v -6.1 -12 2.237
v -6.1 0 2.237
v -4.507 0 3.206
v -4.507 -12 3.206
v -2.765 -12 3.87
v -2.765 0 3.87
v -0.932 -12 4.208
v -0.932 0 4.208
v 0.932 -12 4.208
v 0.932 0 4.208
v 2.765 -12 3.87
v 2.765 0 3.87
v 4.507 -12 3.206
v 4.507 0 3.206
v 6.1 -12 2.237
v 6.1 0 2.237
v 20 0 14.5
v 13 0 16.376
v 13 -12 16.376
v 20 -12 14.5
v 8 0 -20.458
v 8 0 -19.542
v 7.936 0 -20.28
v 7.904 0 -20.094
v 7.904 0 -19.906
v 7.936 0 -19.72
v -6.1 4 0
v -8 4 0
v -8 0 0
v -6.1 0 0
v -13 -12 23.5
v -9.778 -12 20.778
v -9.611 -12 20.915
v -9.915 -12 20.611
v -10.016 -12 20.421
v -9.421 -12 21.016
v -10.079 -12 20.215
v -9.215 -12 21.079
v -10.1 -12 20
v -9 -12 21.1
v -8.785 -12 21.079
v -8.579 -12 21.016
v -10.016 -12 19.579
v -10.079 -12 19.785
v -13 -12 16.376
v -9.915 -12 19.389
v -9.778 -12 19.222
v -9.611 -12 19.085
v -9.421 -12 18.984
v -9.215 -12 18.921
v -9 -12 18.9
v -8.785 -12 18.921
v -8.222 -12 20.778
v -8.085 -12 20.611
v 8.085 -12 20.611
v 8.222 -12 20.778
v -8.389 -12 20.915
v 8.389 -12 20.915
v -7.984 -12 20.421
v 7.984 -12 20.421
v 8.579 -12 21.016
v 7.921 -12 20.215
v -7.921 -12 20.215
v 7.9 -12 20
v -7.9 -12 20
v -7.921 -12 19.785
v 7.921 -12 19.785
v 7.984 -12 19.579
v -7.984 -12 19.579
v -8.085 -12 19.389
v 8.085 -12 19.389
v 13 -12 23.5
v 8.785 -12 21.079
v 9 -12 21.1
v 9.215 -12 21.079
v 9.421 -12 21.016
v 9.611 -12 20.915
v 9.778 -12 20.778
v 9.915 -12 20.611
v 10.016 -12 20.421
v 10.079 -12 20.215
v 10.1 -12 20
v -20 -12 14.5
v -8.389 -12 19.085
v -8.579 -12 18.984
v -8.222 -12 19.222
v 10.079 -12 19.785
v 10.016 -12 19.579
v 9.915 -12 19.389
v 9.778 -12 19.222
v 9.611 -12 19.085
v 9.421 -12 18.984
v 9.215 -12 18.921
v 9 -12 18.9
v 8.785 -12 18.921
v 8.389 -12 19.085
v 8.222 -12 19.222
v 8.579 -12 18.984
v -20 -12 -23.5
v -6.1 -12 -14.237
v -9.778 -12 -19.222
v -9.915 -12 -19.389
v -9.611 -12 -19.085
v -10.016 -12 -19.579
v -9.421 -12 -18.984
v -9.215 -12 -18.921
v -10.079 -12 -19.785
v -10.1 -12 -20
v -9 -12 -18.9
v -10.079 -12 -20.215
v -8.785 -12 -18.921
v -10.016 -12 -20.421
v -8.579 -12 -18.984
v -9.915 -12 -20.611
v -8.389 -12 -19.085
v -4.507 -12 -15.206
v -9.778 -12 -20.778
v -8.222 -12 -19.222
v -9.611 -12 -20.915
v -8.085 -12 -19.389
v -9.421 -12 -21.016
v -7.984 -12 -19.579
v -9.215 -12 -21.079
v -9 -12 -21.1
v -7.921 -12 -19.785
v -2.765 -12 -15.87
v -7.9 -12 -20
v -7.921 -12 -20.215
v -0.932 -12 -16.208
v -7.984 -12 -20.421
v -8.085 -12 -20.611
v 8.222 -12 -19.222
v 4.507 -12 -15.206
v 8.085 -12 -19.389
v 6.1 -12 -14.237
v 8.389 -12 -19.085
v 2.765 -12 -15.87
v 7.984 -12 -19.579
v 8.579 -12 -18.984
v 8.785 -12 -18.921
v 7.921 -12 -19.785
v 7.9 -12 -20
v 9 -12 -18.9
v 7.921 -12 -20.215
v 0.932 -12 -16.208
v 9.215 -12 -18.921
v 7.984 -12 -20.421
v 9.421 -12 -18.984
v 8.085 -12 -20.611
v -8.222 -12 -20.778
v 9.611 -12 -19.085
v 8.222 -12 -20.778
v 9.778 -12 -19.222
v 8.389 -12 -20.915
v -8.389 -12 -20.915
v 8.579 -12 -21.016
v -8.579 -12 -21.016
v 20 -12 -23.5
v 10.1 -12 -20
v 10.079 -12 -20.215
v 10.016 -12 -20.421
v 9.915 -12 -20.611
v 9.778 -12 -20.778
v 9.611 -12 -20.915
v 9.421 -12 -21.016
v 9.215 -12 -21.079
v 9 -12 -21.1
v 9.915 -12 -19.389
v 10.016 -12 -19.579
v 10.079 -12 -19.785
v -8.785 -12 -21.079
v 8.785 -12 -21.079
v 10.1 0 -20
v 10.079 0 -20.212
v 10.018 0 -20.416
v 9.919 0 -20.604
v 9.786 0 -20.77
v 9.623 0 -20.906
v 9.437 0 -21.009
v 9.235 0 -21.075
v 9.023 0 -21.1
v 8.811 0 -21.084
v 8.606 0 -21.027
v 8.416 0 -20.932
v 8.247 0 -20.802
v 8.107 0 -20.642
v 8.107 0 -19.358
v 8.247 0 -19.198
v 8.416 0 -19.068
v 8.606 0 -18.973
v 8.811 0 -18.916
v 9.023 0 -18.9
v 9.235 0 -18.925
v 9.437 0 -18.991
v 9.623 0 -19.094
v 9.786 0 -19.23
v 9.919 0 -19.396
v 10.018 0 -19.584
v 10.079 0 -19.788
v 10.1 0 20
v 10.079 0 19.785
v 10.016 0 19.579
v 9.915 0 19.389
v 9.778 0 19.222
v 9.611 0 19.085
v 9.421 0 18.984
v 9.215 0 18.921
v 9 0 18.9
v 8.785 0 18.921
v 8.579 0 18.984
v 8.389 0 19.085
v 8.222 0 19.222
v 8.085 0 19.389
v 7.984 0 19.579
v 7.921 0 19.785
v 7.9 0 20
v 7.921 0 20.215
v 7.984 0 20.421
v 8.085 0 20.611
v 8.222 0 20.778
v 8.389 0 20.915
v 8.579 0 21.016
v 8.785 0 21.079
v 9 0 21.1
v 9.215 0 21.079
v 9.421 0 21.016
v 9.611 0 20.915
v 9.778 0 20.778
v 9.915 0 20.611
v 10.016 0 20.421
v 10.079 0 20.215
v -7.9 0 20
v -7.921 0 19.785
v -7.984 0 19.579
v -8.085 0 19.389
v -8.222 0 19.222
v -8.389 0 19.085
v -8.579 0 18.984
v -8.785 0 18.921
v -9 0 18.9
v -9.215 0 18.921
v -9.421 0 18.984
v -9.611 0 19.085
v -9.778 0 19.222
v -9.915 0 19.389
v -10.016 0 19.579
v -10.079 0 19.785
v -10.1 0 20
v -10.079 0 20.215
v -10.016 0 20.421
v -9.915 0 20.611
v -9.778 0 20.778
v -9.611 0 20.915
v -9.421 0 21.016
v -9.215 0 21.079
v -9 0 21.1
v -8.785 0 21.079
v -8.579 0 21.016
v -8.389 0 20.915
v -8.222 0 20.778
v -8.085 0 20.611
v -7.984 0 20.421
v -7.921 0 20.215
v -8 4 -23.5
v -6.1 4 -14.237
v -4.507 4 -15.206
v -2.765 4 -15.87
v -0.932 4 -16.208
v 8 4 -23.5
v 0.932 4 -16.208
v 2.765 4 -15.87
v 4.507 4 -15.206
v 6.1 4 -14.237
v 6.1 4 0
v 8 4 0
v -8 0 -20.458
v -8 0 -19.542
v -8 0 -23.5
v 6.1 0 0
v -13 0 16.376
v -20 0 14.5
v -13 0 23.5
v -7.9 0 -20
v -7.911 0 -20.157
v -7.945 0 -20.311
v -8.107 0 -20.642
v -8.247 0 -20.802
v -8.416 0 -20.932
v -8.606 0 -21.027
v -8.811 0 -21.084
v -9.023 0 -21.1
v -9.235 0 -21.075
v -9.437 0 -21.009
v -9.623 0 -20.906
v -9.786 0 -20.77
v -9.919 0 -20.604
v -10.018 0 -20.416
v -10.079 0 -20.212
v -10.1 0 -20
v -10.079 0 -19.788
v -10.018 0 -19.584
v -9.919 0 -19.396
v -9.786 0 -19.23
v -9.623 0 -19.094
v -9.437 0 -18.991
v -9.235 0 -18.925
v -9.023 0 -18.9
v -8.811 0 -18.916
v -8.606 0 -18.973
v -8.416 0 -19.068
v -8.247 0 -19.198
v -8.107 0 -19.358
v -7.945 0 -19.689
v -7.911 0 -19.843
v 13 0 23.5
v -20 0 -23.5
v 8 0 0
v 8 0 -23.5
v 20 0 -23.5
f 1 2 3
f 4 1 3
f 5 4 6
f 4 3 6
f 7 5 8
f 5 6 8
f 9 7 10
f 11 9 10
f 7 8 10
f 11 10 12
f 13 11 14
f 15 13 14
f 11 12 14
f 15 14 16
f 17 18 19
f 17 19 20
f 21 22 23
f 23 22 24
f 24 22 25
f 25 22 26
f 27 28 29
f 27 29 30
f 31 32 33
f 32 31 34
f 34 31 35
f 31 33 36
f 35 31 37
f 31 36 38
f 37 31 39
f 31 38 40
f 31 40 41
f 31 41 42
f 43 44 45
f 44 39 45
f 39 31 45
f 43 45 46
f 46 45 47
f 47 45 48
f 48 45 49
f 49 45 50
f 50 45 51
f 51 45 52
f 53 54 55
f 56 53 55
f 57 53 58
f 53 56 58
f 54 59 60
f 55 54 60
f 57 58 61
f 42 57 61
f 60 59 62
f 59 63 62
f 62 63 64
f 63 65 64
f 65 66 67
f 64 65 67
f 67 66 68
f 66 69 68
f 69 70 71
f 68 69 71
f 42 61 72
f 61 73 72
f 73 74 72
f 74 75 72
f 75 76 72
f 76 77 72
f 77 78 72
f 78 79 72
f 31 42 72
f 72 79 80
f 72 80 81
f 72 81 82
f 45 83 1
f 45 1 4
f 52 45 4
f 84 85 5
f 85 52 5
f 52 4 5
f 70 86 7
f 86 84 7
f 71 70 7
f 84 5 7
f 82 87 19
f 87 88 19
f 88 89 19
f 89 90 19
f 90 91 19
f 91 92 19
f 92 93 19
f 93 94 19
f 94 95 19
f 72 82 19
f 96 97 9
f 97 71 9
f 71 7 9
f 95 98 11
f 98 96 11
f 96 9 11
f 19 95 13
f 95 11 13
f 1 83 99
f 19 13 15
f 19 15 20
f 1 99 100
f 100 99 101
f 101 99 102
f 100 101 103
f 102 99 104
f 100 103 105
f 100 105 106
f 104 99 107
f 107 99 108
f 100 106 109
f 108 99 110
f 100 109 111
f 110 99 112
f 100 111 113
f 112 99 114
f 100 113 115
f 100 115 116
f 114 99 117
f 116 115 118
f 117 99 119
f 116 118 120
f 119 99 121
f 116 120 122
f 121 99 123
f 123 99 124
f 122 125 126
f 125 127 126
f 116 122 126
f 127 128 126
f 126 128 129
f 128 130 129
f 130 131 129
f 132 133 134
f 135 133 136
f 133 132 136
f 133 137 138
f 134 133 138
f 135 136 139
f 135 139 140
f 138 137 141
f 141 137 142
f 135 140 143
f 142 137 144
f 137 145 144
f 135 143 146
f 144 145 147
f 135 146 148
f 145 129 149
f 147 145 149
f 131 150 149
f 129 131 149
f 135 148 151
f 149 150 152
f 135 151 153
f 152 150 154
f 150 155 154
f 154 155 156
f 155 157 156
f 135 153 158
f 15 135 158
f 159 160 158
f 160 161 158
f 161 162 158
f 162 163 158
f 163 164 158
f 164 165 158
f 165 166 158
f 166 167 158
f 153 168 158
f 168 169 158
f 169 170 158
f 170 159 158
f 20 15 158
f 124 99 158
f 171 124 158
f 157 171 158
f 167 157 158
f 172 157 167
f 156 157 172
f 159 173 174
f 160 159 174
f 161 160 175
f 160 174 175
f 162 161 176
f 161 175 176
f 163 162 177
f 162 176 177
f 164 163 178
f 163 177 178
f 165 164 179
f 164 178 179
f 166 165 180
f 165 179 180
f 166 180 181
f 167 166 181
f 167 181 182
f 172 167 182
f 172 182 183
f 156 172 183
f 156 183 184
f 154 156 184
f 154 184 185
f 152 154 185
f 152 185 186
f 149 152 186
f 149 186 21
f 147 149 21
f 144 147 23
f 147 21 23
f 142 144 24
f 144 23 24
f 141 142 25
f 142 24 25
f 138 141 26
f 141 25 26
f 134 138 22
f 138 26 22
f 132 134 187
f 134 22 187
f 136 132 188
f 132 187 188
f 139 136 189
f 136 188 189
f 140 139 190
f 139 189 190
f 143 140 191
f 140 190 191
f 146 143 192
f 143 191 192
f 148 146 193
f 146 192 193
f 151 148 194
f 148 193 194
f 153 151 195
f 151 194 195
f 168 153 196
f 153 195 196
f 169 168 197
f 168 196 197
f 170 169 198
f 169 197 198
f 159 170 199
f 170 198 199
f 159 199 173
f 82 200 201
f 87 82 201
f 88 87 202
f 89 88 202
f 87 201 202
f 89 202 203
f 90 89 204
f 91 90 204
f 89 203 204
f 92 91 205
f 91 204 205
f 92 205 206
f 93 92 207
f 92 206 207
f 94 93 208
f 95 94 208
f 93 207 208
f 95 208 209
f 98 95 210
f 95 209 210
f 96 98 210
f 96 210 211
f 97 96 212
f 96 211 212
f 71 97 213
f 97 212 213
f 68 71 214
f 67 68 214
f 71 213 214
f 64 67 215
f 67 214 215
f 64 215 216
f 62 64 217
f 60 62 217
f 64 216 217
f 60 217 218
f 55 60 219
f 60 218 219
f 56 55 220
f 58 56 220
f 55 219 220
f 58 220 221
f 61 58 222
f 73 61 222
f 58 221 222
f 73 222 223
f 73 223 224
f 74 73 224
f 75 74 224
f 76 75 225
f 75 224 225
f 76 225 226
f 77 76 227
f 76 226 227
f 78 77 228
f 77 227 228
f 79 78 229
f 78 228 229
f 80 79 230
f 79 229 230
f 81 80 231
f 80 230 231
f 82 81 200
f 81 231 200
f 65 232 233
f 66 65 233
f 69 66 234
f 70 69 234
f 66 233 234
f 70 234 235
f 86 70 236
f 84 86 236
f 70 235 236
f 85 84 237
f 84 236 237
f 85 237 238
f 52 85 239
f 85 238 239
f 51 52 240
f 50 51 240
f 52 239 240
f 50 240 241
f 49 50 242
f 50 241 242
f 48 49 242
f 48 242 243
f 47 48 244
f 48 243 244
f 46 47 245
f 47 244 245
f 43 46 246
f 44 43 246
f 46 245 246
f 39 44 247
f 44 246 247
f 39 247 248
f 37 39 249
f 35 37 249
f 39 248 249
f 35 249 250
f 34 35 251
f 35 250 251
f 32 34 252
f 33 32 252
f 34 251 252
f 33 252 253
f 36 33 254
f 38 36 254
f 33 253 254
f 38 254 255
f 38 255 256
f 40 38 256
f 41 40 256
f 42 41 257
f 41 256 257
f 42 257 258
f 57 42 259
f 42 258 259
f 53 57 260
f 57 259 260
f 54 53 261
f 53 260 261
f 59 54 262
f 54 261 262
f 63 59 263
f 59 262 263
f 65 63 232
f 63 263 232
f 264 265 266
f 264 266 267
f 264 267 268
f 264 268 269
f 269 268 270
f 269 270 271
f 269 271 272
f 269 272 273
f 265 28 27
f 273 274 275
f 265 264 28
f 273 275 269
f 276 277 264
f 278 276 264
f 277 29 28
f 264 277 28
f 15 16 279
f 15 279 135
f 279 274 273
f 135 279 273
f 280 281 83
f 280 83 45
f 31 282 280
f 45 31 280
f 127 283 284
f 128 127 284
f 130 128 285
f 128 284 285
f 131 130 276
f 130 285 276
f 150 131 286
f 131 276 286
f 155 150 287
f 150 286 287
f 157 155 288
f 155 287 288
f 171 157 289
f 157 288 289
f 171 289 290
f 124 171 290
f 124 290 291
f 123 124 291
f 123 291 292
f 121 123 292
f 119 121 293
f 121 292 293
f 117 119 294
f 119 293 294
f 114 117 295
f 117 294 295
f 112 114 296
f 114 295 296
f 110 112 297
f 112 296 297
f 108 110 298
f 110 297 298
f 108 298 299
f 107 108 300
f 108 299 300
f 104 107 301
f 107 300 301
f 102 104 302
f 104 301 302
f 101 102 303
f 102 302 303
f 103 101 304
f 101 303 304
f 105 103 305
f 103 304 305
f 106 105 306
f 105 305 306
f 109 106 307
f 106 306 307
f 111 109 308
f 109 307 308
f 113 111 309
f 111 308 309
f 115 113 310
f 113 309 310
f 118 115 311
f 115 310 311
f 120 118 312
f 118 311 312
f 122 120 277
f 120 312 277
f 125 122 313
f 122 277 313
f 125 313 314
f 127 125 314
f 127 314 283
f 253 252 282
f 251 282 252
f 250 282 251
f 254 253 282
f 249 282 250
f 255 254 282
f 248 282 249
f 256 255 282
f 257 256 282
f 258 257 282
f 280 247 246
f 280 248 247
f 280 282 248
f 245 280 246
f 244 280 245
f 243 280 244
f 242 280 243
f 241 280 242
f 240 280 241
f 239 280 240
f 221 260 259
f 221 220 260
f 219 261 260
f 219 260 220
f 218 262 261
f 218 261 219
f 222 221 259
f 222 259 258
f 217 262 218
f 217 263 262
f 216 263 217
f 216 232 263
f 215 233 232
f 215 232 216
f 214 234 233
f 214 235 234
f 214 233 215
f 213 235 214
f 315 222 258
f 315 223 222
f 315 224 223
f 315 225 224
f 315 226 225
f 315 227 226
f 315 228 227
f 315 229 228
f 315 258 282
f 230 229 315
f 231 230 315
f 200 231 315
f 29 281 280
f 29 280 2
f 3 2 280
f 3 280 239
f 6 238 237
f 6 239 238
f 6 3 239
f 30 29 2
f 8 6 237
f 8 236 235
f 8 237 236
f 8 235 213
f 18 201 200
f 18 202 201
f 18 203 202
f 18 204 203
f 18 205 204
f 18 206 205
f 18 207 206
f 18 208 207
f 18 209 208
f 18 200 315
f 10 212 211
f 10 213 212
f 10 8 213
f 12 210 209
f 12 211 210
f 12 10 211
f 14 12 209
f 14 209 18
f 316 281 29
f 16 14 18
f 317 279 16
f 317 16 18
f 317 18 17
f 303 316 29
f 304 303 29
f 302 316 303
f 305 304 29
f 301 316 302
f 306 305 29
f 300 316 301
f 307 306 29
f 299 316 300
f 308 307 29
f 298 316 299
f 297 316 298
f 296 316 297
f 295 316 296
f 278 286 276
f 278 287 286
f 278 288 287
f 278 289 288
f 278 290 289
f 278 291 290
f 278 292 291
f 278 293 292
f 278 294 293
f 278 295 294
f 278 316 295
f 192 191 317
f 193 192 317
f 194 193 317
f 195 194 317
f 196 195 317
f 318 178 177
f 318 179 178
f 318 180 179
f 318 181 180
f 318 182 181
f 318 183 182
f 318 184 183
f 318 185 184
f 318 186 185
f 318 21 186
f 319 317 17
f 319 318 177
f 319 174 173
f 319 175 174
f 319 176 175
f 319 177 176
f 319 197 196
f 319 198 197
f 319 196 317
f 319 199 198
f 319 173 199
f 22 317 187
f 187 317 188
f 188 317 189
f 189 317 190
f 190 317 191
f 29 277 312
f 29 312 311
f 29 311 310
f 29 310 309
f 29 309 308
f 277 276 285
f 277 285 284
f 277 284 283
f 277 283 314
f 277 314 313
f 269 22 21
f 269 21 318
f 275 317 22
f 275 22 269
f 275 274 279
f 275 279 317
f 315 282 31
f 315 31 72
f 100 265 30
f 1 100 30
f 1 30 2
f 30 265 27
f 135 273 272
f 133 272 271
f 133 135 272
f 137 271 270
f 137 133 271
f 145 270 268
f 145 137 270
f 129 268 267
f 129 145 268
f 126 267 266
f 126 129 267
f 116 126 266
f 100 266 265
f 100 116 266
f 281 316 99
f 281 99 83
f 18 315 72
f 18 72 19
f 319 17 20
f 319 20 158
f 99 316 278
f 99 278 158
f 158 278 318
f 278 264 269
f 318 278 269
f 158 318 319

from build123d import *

# Parameters (mm, degrees)
SKETCH1_W               = 26
SKETCH1_H               = 47
SKETCH1_R               = 1.1
BOSS_EXTRUDE1_DEPTH     = 12
SKETCH2_3_W             = 16
SKETCH2_3_H             = 4
BOSS_EXTRUDE2_DEPTH     = 23.5
CUT_EXTRUDE3_DEPTH      = 5
CUT_EXTRUDE3_DEPTH_BACK = 13


with BuildPart() as part:
    # Sketch1 → Boss-Extrude1 (new body)
    with BuildSketch(Plane(origin=(0, 0, 0), x_dir=(1, 0, 0), z_dir=(0, 1, 0))):
        Polygon((-13, -16.375644347), (-13, 23.5), (-20, 23.5), (-20, -14.5), align=None)
        Rectangle(SKETCH1_W, SKETCH1_H)
        with Locations((9, -20)):
            Circle(SKETCH1_R, mode=Mode.SUBTRACT)
        with Locations((-9, -20)):
            Circle(SKETCH1_R, mode=Mode.SUBTRACT)
        with Locations((9, 20)):
            Circle(SKETCH1_R, mode=Mode.SUBTRACT)
        with Locations((-9, 20)):
            Circle(SKETCH1_R, mode=Mode.SUBTRACT)
        Polygon((20, 23.5), (13, 23.5), (13, -16.375644347), (20, -14.5), align=None)
    extrude(amount=-BOSS_EXTRUDE1_DEPTH)

    # Sketch2<3> → Boss-Extrude2 (add)
    with BuildSketch(Plane.XY):
        with Locations((0, 2)):
            Rectangle(SKETCH2_3_W, SKETCH2_3_H)
    extrude(amount=-BOSS_EXTRUDE2_DEPTH)

    # Sketch3 → Cut-Extrude3 (cut, two sides)
    with BuildSketch(Plane(origin=(0, 0, 0), x_dir=(1, 0, 0), z_dir=(0, 1, 0))) as cut_extrude3_sk:
        with BuildLine():
            ThreePointArc((6.1, 14.237262895), (0, 16.25), (-6.1, 14.237262895))
            Line((-6.1, 14.237262895), (-6.1, -2.237262895))
            ThreePointArc((-6.1, -2.237262895), (0, -4.25), (6.1, -2.237262895))
            Line((6.1, -2.237262895), (6.1, 14.237262895))
        make_face()
    extrude(amount=CUT_EXTRUDE3_DEPTH, mode=Mode.SUBTRACT)
    extrude(cut_extrude3_sk.sketch, amount=-CUT_EXTRUDE3_DEPTH_BACK, mode=Mode.SUBTRACT)


solid = part.part
